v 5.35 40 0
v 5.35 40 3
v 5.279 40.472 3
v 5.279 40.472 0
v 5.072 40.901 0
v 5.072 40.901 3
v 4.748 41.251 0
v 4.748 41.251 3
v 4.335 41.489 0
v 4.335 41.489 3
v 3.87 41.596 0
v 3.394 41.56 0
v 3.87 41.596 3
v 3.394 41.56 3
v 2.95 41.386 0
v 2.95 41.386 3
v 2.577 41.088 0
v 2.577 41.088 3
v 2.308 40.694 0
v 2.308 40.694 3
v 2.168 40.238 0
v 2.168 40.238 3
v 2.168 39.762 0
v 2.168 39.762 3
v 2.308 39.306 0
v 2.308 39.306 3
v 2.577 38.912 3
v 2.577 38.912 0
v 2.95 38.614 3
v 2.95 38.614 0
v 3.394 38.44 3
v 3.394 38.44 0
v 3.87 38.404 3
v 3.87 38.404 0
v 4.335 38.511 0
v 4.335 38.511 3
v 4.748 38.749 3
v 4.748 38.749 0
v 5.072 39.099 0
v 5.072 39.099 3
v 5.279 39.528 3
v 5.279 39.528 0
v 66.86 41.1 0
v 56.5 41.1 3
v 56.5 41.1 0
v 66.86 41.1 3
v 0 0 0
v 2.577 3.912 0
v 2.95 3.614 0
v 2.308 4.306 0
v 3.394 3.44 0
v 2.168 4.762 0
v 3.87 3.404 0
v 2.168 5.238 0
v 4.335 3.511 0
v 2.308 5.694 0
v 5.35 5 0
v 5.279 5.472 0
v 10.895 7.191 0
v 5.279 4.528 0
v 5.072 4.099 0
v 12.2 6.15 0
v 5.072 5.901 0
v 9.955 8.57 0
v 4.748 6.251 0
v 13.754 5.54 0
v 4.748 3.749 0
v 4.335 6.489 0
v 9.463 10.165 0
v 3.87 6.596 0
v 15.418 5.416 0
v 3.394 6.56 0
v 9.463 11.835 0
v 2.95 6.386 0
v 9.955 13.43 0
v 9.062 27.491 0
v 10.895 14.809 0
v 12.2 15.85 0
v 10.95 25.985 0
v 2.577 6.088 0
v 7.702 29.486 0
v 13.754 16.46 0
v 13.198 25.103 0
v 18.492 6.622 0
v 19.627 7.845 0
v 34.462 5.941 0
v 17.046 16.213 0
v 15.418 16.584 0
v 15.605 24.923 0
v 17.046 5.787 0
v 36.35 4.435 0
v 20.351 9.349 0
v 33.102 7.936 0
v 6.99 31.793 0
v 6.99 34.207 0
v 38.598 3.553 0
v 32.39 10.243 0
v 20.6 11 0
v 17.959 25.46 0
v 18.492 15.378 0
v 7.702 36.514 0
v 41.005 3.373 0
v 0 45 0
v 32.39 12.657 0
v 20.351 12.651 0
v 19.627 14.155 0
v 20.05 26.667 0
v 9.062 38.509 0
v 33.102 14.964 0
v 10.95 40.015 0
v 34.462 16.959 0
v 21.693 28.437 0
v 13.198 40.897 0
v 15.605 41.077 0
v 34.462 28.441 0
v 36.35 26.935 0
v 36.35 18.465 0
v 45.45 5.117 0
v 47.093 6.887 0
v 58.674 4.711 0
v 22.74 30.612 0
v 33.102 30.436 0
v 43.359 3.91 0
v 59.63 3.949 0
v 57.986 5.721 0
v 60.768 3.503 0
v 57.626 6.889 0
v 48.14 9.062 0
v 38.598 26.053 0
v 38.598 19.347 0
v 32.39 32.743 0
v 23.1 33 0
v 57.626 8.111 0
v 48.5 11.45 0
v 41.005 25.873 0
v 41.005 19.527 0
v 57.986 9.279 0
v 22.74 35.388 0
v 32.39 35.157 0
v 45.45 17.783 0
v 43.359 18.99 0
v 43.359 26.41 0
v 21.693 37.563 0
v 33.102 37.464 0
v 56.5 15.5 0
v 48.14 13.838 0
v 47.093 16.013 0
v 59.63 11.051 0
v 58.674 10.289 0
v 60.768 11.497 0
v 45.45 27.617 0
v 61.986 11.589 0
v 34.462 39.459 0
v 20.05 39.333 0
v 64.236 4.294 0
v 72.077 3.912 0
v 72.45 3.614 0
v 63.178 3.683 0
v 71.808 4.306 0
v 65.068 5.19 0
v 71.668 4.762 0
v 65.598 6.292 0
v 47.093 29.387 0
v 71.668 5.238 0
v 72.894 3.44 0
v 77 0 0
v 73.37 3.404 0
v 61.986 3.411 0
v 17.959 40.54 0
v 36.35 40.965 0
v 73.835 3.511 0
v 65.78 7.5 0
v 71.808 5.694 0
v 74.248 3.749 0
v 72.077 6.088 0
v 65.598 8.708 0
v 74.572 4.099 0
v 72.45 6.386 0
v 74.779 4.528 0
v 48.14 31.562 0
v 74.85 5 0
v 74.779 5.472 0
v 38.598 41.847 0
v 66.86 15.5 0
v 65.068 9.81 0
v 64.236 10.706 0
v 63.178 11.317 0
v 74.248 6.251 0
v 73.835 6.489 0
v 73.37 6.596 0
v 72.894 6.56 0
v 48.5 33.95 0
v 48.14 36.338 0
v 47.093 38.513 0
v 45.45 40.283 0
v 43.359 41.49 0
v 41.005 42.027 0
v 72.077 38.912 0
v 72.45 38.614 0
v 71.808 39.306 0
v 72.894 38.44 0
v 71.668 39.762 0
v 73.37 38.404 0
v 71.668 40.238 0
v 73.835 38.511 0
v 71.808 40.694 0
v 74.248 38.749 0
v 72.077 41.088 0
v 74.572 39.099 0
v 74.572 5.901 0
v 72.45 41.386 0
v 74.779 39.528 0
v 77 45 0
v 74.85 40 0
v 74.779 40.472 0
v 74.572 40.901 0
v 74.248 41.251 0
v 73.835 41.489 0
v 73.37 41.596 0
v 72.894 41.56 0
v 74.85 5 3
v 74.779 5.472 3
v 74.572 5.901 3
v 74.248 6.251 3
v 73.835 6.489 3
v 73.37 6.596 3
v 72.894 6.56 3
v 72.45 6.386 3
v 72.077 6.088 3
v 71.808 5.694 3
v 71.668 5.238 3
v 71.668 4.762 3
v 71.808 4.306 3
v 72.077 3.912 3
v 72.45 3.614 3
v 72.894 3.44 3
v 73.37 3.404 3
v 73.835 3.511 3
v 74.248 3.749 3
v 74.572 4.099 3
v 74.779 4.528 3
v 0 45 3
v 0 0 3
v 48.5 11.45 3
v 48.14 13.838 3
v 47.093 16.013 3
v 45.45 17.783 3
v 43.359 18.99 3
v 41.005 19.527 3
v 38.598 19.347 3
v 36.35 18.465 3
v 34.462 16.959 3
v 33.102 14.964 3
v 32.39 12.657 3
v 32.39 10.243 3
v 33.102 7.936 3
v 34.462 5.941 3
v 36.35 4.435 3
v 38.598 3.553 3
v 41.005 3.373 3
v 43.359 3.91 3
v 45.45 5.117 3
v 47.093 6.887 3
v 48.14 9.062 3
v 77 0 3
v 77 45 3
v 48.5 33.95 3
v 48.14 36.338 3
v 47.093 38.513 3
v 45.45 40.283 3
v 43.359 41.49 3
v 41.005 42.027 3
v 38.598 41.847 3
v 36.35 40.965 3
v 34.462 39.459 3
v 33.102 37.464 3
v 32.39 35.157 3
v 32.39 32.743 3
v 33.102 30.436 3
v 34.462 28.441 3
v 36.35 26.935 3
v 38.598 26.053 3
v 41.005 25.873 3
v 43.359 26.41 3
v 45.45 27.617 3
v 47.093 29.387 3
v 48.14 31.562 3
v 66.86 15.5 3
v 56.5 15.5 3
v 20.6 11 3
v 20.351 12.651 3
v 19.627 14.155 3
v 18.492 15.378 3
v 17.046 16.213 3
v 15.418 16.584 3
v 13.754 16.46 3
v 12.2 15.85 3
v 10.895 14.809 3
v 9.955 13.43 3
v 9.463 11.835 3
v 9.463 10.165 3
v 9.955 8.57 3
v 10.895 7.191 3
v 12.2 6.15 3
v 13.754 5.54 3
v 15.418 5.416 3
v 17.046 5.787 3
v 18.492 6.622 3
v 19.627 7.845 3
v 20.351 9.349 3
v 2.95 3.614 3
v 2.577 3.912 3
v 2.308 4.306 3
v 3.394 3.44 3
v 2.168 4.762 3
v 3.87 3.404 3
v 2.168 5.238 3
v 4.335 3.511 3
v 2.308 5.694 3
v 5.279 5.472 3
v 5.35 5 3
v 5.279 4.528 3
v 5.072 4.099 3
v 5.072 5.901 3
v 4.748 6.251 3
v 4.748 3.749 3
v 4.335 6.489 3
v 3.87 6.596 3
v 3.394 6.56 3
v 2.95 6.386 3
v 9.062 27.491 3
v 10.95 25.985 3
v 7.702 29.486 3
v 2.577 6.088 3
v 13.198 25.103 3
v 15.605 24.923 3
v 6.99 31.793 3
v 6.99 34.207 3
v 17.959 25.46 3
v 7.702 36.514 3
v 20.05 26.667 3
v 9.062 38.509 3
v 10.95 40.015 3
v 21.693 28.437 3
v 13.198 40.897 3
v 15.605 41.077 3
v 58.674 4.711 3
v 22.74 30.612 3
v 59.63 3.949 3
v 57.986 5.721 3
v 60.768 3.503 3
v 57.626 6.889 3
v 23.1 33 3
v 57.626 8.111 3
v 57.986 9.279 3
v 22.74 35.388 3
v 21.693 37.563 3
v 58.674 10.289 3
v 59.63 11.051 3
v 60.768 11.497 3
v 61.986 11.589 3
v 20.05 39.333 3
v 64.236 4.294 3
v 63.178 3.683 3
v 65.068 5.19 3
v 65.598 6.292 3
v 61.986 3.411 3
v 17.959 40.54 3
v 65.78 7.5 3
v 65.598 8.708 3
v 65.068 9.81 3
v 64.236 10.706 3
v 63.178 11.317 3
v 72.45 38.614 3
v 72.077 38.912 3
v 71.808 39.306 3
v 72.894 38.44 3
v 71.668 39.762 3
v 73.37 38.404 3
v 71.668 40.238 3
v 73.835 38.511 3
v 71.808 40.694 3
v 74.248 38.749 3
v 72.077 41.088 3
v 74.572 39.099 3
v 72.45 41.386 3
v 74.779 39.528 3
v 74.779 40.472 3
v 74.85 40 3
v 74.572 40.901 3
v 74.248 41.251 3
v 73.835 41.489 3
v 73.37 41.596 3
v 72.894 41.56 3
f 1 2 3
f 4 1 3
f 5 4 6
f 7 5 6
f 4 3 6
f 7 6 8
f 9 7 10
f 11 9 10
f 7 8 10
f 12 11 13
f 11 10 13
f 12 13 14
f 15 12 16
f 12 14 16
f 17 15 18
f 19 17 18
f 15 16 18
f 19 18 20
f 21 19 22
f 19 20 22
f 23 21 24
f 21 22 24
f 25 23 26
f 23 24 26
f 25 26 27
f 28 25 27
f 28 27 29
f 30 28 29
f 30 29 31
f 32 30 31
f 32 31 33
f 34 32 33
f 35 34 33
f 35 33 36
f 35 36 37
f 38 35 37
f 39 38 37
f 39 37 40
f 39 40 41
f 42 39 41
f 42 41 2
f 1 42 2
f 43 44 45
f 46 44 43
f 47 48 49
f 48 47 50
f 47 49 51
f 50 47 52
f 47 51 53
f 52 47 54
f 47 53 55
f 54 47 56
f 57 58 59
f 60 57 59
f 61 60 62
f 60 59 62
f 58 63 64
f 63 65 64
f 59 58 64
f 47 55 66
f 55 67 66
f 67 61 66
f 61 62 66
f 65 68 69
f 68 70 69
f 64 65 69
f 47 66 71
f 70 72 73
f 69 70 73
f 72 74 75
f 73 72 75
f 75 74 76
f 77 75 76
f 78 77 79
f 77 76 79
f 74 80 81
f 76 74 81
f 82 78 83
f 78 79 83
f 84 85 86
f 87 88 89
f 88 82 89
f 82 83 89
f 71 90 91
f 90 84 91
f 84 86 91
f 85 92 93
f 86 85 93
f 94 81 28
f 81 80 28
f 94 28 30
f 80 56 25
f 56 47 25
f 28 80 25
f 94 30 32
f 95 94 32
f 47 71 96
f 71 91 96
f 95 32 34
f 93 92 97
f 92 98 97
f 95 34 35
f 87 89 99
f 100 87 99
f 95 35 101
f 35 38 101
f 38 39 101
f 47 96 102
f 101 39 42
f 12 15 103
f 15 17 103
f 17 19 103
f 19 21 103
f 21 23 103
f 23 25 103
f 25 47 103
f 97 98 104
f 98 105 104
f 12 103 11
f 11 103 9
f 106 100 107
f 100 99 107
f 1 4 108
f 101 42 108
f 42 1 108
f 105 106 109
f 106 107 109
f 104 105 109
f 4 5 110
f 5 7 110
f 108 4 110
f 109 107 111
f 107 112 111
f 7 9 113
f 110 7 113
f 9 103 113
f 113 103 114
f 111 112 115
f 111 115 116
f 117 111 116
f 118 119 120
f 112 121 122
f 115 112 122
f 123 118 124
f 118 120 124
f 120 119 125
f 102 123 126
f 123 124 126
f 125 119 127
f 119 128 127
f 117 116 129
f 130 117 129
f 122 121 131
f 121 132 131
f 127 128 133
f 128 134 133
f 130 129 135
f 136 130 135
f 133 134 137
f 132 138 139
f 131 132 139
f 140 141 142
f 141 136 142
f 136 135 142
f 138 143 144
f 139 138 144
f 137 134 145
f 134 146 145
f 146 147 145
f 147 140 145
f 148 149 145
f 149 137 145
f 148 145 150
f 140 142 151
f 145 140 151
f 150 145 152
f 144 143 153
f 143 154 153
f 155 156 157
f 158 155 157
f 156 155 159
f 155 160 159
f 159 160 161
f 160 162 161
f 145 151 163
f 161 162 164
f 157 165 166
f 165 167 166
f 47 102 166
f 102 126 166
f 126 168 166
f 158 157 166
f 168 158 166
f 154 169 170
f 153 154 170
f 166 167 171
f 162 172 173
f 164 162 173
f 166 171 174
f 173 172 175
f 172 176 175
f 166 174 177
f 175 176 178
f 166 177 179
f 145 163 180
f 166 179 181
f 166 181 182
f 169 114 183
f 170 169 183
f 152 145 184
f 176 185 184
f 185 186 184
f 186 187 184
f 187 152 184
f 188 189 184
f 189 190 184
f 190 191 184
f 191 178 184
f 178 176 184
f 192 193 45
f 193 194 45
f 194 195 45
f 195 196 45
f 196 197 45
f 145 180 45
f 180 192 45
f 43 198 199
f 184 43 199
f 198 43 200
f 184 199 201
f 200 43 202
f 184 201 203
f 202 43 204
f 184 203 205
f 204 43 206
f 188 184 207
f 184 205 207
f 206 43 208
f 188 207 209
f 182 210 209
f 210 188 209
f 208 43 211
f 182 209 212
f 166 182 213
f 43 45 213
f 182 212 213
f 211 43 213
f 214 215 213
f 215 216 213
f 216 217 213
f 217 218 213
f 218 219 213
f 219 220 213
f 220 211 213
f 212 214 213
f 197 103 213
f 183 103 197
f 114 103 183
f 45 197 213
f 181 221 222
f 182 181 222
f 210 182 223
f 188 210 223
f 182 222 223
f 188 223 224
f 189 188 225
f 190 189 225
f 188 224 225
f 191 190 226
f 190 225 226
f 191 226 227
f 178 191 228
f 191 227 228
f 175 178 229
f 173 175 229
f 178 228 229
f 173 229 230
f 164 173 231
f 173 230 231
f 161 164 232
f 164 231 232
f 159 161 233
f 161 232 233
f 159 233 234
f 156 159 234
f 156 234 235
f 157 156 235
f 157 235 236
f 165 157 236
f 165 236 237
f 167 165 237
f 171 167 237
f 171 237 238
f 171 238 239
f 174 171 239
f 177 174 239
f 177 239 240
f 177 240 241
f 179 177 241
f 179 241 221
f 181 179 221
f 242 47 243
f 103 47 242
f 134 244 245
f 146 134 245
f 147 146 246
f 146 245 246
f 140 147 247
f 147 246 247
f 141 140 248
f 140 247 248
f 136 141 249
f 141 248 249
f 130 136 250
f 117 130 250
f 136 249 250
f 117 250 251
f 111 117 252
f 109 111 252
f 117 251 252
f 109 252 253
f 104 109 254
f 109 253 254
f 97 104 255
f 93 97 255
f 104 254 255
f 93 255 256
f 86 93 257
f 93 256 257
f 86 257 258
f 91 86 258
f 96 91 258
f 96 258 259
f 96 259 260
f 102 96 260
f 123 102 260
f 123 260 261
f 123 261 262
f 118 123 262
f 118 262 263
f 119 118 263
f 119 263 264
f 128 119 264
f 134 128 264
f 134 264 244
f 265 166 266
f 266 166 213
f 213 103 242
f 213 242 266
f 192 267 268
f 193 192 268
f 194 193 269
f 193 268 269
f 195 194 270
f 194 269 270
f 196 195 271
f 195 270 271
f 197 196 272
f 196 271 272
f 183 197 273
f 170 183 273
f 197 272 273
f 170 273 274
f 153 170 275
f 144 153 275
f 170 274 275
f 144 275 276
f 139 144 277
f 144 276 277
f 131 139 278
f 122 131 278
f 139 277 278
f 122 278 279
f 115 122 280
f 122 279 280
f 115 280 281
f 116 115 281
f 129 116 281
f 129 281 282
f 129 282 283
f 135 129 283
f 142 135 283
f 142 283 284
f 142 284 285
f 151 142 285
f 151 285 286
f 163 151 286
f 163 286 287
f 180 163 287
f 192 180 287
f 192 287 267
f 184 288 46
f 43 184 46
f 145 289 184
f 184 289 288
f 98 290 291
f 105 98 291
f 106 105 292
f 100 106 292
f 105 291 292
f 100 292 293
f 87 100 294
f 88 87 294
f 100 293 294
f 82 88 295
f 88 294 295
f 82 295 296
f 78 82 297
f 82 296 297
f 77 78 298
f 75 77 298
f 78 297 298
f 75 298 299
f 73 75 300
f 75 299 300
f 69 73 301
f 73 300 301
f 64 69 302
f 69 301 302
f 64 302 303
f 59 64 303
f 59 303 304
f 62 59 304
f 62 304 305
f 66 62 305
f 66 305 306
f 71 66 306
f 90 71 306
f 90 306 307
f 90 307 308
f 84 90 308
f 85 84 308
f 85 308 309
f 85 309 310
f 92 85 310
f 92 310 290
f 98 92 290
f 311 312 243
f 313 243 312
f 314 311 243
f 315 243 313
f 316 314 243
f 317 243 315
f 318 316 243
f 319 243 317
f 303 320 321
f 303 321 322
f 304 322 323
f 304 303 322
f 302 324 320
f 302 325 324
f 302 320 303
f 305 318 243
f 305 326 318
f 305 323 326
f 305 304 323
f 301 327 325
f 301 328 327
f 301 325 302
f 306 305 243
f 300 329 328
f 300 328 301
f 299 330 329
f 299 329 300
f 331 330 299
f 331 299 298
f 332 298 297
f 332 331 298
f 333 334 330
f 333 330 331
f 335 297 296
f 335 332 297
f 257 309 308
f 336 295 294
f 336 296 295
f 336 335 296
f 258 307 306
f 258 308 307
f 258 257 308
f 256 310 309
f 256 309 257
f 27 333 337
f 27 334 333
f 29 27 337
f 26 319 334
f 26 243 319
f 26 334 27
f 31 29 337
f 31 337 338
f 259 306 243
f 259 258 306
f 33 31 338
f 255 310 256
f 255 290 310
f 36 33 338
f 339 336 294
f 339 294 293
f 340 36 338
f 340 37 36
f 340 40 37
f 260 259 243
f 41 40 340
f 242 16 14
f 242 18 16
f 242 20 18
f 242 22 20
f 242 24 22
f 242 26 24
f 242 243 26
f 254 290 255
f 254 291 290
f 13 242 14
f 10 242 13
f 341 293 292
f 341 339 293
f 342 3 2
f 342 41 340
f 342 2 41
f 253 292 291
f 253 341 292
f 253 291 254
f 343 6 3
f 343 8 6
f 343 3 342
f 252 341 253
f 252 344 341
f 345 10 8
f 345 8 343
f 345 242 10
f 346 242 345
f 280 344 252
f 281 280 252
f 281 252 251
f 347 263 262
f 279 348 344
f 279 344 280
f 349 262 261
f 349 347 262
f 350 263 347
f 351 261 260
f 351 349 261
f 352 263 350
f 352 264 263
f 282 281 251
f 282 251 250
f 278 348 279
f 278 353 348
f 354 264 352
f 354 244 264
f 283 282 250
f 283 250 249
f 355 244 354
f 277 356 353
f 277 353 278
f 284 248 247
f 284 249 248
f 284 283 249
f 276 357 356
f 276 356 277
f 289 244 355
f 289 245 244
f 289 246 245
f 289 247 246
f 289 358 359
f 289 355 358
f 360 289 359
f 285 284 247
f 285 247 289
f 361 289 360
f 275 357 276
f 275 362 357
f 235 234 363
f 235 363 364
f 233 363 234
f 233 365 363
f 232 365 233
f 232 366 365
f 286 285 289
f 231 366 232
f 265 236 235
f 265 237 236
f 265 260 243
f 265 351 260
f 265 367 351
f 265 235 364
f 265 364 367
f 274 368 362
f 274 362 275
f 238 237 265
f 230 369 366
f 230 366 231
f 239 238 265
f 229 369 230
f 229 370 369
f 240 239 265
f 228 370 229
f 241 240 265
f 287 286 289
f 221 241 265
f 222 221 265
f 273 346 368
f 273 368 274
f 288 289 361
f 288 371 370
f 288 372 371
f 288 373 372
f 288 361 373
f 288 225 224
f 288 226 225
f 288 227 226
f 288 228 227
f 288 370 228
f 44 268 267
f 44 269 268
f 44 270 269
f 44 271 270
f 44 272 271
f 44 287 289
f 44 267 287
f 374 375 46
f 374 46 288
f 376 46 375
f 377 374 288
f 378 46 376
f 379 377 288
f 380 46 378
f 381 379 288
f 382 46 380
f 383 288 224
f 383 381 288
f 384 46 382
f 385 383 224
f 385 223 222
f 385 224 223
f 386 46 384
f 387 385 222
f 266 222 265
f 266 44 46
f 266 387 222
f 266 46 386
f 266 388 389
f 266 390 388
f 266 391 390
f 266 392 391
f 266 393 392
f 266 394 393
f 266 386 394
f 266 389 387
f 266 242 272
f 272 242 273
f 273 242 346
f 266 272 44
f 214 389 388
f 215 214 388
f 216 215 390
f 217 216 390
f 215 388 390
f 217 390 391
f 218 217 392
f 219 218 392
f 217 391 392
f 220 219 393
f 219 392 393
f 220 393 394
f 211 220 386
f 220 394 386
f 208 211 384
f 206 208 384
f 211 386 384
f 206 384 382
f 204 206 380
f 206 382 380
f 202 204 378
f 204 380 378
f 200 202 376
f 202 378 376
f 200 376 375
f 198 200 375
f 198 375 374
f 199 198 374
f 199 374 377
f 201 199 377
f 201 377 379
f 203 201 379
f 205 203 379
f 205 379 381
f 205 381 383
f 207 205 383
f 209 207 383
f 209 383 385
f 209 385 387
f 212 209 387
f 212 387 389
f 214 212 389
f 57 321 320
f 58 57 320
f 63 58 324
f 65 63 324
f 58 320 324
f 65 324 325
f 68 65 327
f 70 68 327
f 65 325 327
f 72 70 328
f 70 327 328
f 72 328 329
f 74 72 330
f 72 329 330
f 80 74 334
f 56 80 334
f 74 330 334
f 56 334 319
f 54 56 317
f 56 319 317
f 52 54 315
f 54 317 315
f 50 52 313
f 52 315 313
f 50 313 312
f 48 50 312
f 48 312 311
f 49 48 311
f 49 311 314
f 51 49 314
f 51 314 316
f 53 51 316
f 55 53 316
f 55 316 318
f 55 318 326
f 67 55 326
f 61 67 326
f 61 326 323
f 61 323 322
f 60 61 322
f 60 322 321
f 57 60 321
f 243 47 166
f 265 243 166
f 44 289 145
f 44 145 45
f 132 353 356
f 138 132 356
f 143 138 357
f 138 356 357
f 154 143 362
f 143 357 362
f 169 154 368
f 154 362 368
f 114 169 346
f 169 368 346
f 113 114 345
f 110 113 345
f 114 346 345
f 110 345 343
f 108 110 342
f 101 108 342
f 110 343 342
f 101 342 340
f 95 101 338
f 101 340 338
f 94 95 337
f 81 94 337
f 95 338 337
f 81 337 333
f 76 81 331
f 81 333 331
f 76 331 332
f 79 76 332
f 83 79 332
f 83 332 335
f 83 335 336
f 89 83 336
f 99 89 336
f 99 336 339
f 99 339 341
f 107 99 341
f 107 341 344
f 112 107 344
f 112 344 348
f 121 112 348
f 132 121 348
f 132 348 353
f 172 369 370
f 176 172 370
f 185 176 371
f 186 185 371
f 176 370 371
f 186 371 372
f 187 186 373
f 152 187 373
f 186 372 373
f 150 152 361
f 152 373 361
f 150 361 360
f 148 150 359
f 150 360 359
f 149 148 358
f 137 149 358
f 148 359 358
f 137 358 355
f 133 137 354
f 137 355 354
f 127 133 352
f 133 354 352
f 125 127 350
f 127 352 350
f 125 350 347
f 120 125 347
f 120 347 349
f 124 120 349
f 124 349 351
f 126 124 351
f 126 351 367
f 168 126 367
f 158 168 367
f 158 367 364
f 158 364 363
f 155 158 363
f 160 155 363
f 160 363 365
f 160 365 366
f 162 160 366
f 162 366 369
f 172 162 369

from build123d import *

# Parameters (mm, degrees)
CROQUIS1_W              = 77
CROQUIS1_H              = 45
SALIENTE_EXTRUIR1_DEPTH = 3
CORTAR_EXTRUIR1_REACH   = 5
CROQUIS2_R              = 8.1
CROQUIS2_R_2            = 5.6
CROQUIS2_R_3            = 4.1
CROQUIS2_R_4            = 1.6
CROQUIS2_W              = 10.36
CROQUIS2_H              = 25.6


with BuildPart() as part:
    # Croquis1 → Saliente-Extruir1 (new body)
    with BuildSketch(Plane.XY):
        with Locations((38.5, 22.5)):
            Rectangle(CROQUIS1_W, CROQUIS1_H)
    extrude(amount=SALIENTE_EXTRUIR1_DEPTH)

    # Croquis2 → Cortar-Extruir1 (cut, up to next)
    with BuildSketch(Plane.XY.offset(3), mode=Mode.PRIVATE) as cortar_extruir1_sk1:
        with Locations((15, 33)):
            Circle(CROQUIS2_R)
    cortar_extruir1_tool1 = extrude(cortar_extruir1_sk1.sketch, amount=-CORTAR_EXTRUIR1_REACH, mode=Mode.PRIVATE) & part.part
    add(cortar_extruir1_tool1.solids().sort_by_distance((15, 33, 3))[0], mode=Mode.SUBTRACT)
    # Croquis2 → Cortar-Extruir1 (cut, up to next)
    with BuildSketch(Plane.XY.offset(3), mode=Mode.PRIVATE) as cortar_extruir1_sk2:
        with Locations((15, 11)):
            Circle(CROQUIS2_R_2)
    cortar_extruir1_tool2 = extrude(cortar_extruir1_sk2.sketch, amount=-CORTAR_EXTRUIR1_REACH, mode=Mode.PRIVATE) & part.part
    add(cortar_extruir1_tool2.solids().sort_by_distance((15, 11, 3))[0], mode=Mode.SUBTRACT)
    # Croquis2 → Cortar-Extruir1 (cut, up to next)
    with BuildSketch(Plane.XY.offset(3), mode=Mode.PRIVATE) as cortar_extruir1_sk3:
        with Locations((61.68, 7.5)):
            Circle(CROQUIS2_R_3)
    cortar_extruir1_tool3 = extrude(cortar_extruir1_sk3.sketch, amount=-CORTAR_EXTRUIR1_REACH, mode=Mode.PRIVATE) & part.part
    add(cortar_extruir1_tool3.solids().sort_by_distance((61.68, 7.5, 3))[0], mode=Mode.SUBTRACT)
    # Croquis2 → Cortar-Extruir1 (cut, up to next)
    with BuildSketch(Plane.XY.offset(3), mode=Mode.PRIVATE) as cortar_extruir1_sk4:
        with Locations((40.4, 33.95)):
            Circle(CROQUIS2_R)
    cortar_extruir1_tool4 = extrude(cortar_extruir1_sk4.sketch, amount=-CORTAR_EXTRUIR1_REACH, mode=Mode.PRIVATE) & part.part
    add(cortar_extruir1_tool4.solids().sort_by_distance((40.4, 33.95, 3))[0], mode=Mode.SUBTRACT)
    # Croquis2 → Cortar-Extruir1 (cut, up to next)
    with BuildSketch(Plane.XY.offset(3), mode=Mode.PRIVATE) as cortar_extruir1_sk5:
        with Locations((40.4, 11.45)):
            Circle(CROQUIS2_R)
    cortar_extruir1_tool5 = extrude(cortar_extruir1_sk5.sketch, amount=-CORTAR_EXTRUIR1_REACH, mode=Mode.PRIVATE) & part.part
    add(cortar_extruir1_tool5.solids().sort_by_distance((40.4, 11.45, 3))[0], mode=Mode.SUBTRACT)
    # Croquis2 → Cortar-Extruir1 (cut, up to next)
    with BuildSketch(Plane.XY.offset(3), mode=Mode.PRIVATE) as cortar_extruir1_sk6:
        with Locations((73.25, 40)):
            Circle(CROQUIS2_R_4)
    cortar_extruir1_tool6 = extrude(cortar_extruir1_sk6.sketch, amount=-CORTAR_EXTRUIR1_REACH, mode=Mode.PRIVATE) & part.part
    add(cortar_extruir1_tool6.solids().sort_by_distance((73.25, 40, 3))[0], mode=Mode.SUBTRACT)
    # Croquis2 → Cortar-Extruir1 (cut, up to next)
    with BuildSketch(Plane.XY.offset(3), mode=Mode.PRIVATE) as cortar_extruir1_sk7:
        with Locations((73.25, 5)):
            Circle(CROQUIS2_R_4)
    cortar_extruir1_tool7 = extrude(cortar_extruir1_sk7.sketch, amount=-CORTAR_EXTRUIR1_REACH, mode=Mode.PRIVATE) & part.part
    add(cortar_extruir1_tool7.solids().sort_by_distance((73.25, 5, 3))[0], mode=Mode.SUBTRACT)
    # Croquis2 → Cortar-Extruir1 (cut, up to next)
    with BuildSketch(Plane.XY.offset(3), mode=Mode.PRIVATE) as cortar_extruir1_sk8:
        with Locations((3.75, 5)):
            Circle(CROQUIS2_R_4)
    cortar_extruir1_tool8 = extrude(cortar_extruir1_sk8.sketch, amount=-CORTAR_EXTRUIR1_REACH, mode=Mode.PRIVATE) & part.part
    add(cortar_extruir1_tool8.solids().sort_by_distance((3.75, 5, 3))[0], mode=Mode.SUBTRACT)
    # Croquis2 → Cortar-Extruir1 (cut, up to next)
    with BuildSketch(Plane.XY.offset(3), mode=Mode.PRIVATE) as cortar_extruir1_sk9:
        with Locations((3.75, 40)):
            Circle(CROQUIS2_R_4)
    cortar_extruir1_tool9 = extrude(cortar_extruir1_sk9.sketch, amount=-CORTAR_EXTRUIR1_REACH, mode=Mode.PRIVATE) & part.part
    add(cortar_extruir1_tool9.solids().sort_by_distance((3.75, 40, 3))[0], mode=Mode.SUBTRACT)
    # Croquis2 → Cortar-Extruir1 (cut, up to next)
    with BuildSketch(Plane.XY.offset(3), mode=Mode.PRIVATE) as cortar_extruir1_sk10:
        with Locations((61.68, 28.3)):
            Rectangle(CROQUIS2_W, CROQUIS2_H)
    cortar_extruir1_tool10 = extrude(cortar_extruir1_sk10.sketch, amount=-CORTAR_EXTRUIR1_REACH, mode=Mode.PRIVATE) & part.part
    add(cortar_extruir1_tool10.solids().sort_by_distance((61.68, 28.3, 3))[0], mode=Mode.SUBTRACT)


solid = part.part
